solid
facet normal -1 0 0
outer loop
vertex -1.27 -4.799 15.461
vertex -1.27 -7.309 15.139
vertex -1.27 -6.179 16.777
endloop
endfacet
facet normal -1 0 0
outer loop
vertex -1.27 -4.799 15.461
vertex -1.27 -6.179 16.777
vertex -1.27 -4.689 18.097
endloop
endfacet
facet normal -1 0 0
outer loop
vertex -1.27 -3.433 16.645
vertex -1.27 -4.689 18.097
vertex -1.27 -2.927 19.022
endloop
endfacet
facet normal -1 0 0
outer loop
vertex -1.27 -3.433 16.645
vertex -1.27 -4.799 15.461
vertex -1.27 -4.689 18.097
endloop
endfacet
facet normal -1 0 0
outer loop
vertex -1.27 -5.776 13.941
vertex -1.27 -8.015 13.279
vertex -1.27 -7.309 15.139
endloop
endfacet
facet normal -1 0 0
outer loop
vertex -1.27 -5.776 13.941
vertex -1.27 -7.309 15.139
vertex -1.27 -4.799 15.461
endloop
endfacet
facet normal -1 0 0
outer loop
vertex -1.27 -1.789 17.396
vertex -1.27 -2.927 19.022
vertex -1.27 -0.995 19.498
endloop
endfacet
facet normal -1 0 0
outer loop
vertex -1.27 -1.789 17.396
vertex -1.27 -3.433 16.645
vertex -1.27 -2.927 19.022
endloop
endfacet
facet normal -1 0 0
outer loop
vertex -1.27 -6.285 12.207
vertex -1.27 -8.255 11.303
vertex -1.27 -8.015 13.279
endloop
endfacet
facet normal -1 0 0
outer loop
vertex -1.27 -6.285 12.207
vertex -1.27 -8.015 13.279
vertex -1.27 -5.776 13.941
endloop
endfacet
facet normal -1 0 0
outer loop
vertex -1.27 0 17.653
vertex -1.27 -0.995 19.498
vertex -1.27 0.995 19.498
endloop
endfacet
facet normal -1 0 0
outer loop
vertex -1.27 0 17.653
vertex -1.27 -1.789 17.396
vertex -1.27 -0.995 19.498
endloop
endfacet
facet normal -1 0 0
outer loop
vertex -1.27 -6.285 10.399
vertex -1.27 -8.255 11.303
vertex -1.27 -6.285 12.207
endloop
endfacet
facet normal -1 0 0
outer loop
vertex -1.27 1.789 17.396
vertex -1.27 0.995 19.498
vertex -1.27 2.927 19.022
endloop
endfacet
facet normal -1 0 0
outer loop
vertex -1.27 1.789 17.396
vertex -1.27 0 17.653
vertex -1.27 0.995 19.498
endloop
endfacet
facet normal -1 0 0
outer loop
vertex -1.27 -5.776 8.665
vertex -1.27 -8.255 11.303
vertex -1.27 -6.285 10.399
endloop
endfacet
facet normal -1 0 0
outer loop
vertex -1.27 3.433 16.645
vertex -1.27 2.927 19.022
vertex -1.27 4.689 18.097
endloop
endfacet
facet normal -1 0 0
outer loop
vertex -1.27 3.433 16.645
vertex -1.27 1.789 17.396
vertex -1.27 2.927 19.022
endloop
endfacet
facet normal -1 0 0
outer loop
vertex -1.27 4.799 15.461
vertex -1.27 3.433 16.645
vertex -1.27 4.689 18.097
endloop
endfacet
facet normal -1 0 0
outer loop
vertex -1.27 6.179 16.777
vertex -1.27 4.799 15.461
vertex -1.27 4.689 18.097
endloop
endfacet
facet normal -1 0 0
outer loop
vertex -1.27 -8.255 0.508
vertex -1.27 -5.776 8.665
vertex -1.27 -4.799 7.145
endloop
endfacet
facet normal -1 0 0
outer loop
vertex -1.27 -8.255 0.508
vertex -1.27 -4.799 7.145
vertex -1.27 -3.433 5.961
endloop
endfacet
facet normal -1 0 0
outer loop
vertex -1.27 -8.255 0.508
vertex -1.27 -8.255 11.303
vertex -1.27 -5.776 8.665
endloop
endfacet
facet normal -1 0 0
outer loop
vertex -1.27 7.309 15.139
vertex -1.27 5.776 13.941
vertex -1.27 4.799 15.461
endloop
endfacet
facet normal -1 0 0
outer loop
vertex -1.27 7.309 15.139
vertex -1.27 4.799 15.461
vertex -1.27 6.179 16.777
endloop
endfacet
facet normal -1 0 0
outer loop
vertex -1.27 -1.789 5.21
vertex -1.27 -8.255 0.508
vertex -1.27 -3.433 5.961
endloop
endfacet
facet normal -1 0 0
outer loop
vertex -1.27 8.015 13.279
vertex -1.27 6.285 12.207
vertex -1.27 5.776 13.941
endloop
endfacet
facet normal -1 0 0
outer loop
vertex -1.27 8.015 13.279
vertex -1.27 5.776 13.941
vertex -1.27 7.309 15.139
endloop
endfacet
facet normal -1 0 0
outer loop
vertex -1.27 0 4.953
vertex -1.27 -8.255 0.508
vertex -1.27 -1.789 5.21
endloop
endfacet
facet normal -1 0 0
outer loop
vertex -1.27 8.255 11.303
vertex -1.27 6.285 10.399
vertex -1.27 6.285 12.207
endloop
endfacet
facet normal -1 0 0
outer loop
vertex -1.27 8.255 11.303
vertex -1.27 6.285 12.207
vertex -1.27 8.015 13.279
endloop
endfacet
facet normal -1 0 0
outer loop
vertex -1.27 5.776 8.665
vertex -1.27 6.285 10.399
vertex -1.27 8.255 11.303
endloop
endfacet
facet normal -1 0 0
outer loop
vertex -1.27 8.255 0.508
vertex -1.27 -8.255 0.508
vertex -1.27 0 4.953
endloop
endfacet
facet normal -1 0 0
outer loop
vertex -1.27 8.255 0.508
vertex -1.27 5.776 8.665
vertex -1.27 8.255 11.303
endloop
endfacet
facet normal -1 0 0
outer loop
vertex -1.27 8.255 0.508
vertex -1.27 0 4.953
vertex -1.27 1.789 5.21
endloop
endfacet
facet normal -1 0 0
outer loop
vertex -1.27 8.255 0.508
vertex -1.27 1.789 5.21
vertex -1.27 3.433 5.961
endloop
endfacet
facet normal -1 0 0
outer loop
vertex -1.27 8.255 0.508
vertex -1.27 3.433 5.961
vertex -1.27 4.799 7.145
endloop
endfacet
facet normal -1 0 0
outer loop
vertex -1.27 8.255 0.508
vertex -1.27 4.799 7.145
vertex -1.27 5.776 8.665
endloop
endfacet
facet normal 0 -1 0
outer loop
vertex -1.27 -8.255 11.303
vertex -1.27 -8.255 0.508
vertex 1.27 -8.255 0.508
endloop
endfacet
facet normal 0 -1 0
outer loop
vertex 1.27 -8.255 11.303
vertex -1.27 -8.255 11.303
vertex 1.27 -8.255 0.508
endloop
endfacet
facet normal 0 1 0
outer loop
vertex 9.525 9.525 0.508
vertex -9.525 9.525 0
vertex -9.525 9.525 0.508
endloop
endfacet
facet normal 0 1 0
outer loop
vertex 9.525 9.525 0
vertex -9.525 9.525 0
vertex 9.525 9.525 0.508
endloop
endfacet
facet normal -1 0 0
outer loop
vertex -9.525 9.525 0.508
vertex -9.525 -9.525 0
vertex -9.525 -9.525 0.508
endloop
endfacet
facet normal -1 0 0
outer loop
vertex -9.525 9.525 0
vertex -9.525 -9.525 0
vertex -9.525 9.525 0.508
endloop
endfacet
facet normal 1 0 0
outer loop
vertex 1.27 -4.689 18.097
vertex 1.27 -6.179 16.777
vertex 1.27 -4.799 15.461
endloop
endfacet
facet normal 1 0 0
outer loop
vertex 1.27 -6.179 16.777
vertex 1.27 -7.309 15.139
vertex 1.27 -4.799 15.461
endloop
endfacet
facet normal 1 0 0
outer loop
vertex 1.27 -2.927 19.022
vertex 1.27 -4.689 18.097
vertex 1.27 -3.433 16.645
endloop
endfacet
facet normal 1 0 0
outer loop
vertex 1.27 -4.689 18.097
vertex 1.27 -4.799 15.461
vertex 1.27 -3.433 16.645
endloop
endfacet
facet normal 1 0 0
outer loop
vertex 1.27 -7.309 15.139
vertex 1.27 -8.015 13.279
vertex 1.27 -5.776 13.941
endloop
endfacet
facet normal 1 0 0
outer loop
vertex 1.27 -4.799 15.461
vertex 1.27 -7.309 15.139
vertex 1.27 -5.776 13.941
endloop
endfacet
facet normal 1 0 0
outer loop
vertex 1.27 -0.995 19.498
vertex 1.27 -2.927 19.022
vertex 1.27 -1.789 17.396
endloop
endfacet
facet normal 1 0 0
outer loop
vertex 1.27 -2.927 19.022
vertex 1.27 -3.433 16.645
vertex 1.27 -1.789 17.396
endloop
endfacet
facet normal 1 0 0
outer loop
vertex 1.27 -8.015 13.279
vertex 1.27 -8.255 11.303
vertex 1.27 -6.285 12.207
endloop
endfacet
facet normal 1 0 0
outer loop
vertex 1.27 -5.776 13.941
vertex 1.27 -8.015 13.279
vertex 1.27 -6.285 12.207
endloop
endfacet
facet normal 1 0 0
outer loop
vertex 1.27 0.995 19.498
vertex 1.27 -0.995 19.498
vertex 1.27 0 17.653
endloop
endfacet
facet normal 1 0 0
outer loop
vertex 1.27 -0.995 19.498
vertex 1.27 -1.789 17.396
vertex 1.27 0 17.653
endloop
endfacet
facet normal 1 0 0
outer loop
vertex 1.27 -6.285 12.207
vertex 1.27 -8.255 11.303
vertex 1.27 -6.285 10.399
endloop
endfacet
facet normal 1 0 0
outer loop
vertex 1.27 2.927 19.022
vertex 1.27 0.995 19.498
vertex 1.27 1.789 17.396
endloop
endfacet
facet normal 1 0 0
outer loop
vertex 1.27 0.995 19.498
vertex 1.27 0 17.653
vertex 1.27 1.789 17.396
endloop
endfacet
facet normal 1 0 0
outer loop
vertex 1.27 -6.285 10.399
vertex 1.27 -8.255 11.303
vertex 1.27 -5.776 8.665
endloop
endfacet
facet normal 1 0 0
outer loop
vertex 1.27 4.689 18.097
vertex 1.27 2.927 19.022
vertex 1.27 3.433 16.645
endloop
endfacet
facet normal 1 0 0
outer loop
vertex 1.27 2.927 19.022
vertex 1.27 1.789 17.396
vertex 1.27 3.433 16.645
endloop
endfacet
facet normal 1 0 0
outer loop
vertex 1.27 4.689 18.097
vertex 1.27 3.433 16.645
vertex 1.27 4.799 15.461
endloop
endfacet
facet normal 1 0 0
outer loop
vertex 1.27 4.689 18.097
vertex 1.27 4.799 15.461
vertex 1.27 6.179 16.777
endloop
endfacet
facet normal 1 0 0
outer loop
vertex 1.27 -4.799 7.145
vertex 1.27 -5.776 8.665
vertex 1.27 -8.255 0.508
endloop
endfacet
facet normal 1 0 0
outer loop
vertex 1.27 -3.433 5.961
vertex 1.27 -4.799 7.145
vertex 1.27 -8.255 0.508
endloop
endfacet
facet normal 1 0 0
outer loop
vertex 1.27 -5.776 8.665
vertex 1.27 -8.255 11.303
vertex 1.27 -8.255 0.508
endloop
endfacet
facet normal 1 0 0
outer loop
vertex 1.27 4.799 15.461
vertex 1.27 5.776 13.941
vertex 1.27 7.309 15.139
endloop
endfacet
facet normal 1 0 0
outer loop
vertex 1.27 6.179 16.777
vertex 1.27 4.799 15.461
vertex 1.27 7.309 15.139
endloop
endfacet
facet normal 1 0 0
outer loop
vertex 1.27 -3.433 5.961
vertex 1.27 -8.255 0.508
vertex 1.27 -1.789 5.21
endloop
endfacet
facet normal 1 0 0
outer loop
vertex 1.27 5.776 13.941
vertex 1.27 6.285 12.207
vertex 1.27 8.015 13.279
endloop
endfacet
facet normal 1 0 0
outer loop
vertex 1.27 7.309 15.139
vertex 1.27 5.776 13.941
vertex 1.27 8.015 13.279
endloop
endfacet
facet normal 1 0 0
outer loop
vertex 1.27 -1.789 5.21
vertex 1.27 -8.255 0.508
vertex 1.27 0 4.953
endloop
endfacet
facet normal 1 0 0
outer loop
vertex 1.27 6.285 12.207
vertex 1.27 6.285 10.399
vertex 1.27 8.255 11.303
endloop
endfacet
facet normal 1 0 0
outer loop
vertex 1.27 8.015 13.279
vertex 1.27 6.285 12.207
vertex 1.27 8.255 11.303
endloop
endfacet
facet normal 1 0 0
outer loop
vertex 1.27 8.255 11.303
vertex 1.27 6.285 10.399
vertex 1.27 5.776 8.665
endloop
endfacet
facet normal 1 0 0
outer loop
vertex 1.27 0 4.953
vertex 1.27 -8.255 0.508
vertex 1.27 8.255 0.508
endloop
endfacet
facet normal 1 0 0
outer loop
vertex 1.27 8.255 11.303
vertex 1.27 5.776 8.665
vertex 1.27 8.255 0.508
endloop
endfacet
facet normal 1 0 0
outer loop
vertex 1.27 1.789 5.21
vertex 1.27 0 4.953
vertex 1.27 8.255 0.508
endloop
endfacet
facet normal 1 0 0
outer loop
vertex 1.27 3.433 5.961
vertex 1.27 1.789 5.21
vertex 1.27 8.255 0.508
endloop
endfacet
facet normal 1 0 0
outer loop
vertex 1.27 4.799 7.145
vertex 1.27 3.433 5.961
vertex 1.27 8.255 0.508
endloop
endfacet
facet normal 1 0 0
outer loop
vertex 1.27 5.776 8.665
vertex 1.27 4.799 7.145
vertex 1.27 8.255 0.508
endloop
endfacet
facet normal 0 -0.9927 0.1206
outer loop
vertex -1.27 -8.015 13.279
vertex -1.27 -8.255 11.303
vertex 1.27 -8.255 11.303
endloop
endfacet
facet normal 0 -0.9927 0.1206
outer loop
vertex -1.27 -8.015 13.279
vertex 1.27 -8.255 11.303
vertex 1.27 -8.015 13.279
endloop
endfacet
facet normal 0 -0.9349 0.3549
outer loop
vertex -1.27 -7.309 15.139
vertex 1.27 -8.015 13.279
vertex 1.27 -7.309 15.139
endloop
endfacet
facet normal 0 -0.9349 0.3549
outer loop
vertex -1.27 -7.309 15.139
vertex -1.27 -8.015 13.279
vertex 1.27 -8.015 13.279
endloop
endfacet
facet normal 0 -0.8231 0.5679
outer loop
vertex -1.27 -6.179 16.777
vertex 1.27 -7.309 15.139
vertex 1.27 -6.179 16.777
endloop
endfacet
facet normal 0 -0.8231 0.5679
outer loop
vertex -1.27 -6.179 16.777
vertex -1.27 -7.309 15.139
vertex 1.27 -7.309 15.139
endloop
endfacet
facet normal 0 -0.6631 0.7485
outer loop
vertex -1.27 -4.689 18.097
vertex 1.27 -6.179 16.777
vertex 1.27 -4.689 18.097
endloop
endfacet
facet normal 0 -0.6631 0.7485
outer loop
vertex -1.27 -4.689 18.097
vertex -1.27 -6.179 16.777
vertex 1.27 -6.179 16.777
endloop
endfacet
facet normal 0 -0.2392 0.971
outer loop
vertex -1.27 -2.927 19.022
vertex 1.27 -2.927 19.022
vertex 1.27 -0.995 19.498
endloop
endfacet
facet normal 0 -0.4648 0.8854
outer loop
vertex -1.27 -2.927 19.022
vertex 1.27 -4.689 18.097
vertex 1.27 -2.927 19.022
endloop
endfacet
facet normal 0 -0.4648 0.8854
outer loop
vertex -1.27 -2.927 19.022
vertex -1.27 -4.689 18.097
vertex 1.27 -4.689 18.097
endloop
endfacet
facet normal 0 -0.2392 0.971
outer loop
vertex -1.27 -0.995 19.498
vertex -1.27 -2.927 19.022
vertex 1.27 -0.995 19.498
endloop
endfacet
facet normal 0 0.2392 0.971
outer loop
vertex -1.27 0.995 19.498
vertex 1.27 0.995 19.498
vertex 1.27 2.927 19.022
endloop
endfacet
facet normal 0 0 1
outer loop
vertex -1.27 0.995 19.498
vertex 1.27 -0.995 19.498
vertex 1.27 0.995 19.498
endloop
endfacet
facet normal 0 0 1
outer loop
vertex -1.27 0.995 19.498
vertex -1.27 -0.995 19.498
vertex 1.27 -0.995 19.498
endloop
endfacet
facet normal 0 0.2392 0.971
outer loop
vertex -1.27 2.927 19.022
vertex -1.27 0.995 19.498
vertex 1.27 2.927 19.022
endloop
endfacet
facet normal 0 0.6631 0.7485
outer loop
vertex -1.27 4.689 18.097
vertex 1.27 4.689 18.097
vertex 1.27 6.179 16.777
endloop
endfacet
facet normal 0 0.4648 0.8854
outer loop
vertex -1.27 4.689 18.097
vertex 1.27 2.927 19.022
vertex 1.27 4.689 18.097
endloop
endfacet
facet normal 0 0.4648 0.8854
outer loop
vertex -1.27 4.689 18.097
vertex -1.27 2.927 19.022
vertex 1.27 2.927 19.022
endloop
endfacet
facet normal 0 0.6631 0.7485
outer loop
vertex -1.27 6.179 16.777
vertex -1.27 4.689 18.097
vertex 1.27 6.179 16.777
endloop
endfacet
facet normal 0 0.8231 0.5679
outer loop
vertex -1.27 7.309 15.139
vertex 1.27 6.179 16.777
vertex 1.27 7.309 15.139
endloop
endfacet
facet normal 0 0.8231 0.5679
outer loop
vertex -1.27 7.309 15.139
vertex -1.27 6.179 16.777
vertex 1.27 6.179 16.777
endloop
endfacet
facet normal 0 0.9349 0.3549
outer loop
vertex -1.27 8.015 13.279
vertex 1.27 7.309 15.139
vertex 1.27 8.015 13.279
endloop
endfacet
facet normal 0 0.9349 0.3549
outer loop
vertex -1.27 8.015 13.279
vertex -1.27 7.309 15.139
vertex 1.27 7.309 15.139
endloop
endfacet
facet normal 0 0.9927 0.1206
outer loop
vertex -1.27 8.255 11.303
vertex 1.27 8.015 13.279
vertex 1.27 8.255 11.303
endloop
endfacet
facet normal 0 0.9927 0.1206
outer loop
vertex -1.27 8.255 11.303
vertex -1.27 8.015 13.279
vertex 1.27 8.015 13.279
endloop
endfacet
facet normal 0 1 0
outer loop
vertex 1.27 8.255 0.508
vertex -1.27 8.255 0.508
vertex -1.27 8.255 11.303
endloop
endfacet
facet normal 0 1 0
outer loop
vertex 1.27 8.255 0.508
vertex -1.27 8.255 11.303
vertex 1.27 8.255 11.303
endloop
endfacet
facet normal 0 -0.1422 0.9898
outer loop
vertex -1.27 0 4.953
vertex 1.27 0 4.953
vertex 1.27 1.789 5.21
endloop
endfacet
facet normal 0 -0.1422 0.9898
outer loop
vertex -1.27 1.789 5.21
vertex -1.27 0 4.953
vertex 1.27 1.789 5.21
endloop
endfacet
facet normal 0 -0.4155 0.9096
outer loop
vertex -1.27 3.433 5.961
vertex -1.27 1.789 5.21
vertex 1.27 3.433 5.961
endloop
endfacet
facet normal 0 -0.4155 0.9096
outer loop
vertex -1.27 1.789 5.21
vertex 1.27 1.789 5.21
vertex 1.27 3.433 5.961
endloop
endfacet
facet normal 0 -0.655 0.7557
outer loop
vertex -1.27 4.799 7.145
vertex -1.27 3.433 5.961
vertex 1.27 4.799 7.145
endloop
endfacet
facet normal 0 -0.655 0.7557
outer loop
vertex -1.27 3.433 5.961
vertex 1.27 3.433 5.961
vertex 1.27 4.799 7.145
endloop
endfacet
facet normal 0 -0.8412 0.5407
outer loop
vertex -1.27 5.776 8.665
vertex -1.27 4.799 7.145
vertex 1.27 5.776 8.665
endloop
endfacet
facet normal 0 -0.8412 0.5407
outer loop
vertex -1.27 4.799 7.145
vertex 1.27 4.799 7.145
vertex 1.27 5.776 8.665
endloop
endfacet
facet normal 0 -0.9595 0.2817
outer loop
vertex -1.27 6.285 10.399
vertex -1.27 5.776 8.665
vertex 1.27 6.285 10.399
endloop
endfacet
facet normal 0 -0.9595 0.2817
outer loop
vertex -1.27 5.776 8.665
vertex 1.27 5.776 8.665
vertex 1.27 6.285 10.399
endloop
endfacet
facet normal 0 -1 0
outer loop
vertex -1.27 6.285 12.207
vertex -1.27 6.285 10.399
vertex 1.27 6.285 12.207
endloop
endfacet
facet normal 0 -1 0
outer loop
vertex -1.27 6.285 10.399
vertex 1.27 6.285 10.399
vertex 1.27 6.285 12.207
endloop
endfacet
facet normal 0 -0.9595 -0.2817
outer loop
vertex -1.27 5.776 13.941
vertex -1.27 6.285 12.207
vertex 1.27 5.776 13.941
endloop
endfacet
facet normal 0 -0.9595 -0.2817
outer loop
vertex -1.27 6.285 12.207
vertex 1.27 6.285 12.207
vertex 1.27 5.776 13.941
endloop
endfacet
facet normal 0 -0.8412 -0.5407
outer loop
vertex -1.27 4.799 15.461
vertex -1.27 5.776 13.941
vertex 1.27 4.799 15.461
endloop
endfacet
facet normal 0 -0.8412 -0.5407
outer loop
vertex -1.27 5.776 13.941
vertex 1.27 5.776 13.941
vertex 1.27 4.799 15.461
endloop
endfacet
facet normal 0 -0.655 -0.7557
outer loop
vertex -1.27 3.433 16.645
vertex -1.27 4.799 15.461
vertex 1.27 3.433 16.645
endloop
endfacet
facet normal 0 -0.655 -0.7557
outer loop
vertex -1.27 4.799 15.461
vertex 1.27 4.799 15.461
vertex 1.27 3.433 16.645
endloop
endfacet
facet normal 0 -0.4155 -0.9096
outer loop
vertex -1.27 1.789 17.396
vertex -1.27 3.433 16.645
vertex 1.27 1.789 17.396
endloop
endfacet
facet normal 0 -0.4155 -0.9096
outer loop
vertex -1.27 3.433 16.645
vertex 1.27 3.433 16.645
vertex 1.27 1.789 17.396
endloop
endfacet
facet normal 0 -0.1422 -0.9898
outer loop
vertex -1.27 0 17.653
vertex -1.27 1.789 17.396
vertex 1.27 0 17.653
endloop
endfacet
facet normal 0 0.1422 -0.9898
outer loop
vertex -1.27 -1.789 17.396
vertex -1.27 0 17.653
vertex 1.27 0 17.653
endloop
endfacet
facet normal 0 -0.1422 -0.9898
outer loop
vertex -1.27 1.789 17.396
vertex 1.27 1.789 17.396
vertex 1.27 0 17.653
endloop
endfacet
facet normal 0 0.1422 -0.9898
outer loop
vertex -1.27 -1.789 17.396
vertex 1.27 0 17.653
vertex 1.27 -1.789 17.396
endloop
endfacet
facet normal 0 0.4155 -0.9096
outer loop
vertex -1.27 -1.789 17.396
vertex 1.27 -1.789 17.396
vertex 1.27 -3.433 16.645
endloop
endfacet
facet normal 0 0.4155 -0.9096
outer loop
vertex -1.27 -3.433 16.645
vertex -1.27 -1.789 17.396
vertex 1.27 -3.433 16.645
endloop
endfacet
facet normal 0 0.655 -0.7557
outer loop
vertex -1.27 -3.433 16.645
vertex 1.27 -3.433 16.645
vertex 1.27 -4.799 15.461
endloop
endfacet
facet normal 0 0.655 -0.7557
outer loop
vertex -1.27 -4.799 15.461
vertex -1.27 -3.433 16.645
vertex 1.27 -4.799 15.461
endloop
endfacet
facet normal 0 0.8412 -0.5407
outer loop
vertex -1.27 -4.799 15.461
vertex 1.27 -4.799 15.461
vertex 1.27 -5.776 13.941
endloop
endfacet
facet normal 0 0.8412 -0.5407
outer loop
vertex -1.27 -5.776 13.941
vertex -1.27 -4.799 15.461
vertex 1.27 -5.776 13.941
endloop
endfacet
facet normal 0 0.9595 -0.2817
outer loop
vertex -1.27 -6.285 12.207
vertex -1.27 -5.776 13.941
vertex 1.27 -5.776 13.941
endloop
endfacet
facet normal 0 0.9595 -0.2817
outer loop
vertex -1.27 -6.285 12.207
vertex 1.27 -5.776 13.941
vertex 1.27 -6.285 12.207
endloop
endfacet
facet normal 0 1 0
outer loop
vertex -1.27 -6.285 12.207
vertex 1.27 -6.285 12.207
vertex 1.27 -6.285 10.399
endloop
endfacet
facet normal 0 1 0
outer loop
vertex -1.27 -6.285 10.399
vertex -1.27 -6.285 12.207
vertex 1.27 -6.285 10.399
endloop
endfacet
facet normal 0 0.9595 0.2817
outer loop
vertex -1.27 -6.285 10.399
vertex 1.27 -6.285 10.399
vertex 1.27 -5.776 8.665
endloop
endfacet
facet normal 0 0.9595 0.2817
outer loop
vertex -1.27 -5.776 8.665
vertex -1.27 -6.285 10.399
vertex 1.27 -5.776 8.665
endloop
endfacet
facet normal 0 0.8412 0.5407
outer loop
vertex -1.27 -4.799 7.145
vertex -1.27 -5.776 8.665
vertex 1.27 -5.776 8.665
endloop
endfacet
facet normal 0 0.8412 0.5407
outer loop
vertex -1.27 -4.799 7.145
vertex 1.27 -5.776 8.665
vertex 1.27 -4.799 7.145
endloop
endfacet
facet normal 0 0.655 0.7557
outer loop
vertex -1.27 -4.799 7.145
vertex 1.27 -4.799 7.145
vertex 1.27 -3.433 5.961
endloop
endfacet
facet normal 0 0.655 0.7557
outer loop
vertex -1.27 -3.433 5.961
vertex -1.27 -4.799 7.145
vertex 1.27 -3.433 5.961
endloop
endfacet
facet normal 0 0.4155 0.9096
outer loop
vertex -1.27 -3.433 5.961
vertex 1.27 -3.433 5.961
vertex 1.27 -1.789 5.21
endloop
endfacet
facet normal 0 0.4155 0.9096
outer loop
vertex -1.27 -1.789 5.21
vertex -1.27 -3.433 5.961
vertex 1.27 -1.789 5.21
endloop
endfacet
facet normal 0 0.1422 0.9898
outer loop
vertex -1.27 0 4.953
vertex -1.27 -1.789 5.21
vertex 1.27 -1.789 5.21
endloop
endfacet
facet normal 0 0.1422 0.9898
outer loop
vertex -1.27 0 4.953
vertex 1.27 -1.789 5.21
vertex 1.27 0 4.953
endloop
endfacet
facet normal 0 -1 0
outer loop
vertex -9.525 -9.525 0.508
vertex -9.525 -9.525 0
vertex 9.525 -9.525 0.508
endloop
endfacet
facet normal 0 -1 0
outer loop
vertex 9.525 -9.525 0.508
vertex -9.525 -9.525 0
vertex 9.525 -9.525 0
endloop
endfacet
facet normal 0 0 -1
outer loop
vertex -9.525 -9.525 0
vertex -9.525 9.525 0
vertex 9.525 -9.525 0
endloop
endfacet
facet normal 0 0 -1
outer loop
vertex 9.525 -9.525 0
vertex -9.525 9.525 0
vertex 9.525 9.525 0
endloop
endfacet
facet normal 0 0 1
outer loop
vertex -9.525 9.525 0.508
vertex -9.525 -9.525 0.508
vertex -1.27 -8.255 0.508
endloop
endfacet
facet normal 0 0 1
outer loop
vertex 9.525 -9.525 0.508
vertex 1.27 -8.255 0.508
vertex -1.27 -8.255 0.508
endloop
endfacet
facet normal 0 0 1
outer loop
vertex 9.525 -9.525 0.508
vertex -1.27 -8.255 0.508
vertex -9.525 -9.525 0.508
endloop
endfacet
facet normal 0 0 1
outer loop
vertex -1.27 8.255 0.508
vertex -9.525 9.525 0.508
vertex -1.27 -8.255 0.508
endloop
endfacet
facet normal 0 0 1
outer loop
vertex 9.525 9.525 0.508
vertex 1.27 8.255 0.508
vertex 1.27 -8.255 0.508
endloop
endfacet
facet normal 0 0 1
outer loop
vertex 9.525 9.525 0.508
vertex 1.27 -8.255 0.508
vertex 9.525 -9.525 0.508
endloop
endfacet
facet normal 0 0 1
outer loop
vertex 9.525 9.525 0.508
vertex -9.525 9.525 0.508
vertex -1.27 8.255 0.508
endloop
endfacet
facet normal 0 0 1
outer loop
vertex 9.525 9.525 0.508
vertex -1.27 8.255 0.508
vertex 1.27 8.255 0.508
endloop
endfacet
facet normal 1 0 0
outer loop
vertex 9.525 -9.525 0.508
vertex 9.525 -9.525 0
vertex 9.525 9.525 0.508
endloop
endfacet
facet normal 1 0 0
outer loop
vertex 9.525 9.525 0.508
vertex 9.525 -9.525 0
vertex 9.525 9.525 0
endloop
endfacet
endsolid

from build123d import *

# Parameters (mm, degrees)
SKETCH2_W           = 19.05
SKETCH2_H           = 19.05
BOSS_EXTRUDE1_DEPTH = 0.508
SKETCH3_W           = 2.54
SKETCH3_H           = 16.51
BOSS_EXTRUDE2_DEPTH = 19.05
CUT_EXTRUDE1_REACH  = 26.285
SKETCH4_R           = 6.35
CUT_EXTRUDE2_START  = -2.54
CUT_EXTRUDE2_DEPTH  = 2.54


with BuildPart() as part:
    # Sketch2 → Boss-Extrude1 (new body)
    with BuildSketch(Plane.XY):
        Rectangle(SKETCH2_W, SKETCH2_H)
    extrude(amount=BOSS_EXTRUDE1_DEPTH)

    # Sketch3 → Boss-Extrude2 (add)
    with BuildSketch(Plane.XY.offset(0.508)):
        Rectangle(SKETCH3_W, SKETCH3_H)
    extrude(amount=BOSS_EXTRUDE2_DEPTH)

    # Sketch4 → Cut-Extrude1 (cut, up to next)
    with BuildSketch(Plane(origin=(1.27, 0, 0), x_dir=(0, 0, -1), z_dir=(1, 0, 0)), mode=Mode.PRIVATE) as cut_extrude1_sk1:
        with Locations((-11.303, 0)):
            Circle(SKETCH4_R)
    cut_extrude1_tool1 = extrude(cut_extrude1_sk1.sketch, amount=-CUT_EXTRUDE1_REACH, mode=Mode.PRIVATE) & part.part
    add(cut_extrude1_tool1.solids().sort_by_distance((1.27, 0, 11.303))[0], mode=Mode.SUBTRACT)

    # Sketch9 → Cut-Extrude2 (cut)
    with BuildSketch(Plane(origin=(1.27, 0, 0), x_dir=(0, 0, -1), z_dir=(1, 0, 0)).offset(CUT_EXTRUDE2_START)):
        with BuildLine():
            ThreePointArc((-11.303, 12.7), (-24.003, 0), (-11.303, -12.7))
            ThreePointArc((-11.303, -12.7), (-9.0805, -10.4775), (-11.303, -8.255))
            ThreePointArc((-11.303, -8.255), (-19.558, 0), (-11.303, 8.255))
            ThreePointArc((-11.303, 8.255), (-9.0805, 10.4775), (-11.303, 12.7))
        make_face()
    extrude(amount=CUT_EXTRUDE2_DEPTH, mode=Mode.SUBTRACT)


solid = part.part
